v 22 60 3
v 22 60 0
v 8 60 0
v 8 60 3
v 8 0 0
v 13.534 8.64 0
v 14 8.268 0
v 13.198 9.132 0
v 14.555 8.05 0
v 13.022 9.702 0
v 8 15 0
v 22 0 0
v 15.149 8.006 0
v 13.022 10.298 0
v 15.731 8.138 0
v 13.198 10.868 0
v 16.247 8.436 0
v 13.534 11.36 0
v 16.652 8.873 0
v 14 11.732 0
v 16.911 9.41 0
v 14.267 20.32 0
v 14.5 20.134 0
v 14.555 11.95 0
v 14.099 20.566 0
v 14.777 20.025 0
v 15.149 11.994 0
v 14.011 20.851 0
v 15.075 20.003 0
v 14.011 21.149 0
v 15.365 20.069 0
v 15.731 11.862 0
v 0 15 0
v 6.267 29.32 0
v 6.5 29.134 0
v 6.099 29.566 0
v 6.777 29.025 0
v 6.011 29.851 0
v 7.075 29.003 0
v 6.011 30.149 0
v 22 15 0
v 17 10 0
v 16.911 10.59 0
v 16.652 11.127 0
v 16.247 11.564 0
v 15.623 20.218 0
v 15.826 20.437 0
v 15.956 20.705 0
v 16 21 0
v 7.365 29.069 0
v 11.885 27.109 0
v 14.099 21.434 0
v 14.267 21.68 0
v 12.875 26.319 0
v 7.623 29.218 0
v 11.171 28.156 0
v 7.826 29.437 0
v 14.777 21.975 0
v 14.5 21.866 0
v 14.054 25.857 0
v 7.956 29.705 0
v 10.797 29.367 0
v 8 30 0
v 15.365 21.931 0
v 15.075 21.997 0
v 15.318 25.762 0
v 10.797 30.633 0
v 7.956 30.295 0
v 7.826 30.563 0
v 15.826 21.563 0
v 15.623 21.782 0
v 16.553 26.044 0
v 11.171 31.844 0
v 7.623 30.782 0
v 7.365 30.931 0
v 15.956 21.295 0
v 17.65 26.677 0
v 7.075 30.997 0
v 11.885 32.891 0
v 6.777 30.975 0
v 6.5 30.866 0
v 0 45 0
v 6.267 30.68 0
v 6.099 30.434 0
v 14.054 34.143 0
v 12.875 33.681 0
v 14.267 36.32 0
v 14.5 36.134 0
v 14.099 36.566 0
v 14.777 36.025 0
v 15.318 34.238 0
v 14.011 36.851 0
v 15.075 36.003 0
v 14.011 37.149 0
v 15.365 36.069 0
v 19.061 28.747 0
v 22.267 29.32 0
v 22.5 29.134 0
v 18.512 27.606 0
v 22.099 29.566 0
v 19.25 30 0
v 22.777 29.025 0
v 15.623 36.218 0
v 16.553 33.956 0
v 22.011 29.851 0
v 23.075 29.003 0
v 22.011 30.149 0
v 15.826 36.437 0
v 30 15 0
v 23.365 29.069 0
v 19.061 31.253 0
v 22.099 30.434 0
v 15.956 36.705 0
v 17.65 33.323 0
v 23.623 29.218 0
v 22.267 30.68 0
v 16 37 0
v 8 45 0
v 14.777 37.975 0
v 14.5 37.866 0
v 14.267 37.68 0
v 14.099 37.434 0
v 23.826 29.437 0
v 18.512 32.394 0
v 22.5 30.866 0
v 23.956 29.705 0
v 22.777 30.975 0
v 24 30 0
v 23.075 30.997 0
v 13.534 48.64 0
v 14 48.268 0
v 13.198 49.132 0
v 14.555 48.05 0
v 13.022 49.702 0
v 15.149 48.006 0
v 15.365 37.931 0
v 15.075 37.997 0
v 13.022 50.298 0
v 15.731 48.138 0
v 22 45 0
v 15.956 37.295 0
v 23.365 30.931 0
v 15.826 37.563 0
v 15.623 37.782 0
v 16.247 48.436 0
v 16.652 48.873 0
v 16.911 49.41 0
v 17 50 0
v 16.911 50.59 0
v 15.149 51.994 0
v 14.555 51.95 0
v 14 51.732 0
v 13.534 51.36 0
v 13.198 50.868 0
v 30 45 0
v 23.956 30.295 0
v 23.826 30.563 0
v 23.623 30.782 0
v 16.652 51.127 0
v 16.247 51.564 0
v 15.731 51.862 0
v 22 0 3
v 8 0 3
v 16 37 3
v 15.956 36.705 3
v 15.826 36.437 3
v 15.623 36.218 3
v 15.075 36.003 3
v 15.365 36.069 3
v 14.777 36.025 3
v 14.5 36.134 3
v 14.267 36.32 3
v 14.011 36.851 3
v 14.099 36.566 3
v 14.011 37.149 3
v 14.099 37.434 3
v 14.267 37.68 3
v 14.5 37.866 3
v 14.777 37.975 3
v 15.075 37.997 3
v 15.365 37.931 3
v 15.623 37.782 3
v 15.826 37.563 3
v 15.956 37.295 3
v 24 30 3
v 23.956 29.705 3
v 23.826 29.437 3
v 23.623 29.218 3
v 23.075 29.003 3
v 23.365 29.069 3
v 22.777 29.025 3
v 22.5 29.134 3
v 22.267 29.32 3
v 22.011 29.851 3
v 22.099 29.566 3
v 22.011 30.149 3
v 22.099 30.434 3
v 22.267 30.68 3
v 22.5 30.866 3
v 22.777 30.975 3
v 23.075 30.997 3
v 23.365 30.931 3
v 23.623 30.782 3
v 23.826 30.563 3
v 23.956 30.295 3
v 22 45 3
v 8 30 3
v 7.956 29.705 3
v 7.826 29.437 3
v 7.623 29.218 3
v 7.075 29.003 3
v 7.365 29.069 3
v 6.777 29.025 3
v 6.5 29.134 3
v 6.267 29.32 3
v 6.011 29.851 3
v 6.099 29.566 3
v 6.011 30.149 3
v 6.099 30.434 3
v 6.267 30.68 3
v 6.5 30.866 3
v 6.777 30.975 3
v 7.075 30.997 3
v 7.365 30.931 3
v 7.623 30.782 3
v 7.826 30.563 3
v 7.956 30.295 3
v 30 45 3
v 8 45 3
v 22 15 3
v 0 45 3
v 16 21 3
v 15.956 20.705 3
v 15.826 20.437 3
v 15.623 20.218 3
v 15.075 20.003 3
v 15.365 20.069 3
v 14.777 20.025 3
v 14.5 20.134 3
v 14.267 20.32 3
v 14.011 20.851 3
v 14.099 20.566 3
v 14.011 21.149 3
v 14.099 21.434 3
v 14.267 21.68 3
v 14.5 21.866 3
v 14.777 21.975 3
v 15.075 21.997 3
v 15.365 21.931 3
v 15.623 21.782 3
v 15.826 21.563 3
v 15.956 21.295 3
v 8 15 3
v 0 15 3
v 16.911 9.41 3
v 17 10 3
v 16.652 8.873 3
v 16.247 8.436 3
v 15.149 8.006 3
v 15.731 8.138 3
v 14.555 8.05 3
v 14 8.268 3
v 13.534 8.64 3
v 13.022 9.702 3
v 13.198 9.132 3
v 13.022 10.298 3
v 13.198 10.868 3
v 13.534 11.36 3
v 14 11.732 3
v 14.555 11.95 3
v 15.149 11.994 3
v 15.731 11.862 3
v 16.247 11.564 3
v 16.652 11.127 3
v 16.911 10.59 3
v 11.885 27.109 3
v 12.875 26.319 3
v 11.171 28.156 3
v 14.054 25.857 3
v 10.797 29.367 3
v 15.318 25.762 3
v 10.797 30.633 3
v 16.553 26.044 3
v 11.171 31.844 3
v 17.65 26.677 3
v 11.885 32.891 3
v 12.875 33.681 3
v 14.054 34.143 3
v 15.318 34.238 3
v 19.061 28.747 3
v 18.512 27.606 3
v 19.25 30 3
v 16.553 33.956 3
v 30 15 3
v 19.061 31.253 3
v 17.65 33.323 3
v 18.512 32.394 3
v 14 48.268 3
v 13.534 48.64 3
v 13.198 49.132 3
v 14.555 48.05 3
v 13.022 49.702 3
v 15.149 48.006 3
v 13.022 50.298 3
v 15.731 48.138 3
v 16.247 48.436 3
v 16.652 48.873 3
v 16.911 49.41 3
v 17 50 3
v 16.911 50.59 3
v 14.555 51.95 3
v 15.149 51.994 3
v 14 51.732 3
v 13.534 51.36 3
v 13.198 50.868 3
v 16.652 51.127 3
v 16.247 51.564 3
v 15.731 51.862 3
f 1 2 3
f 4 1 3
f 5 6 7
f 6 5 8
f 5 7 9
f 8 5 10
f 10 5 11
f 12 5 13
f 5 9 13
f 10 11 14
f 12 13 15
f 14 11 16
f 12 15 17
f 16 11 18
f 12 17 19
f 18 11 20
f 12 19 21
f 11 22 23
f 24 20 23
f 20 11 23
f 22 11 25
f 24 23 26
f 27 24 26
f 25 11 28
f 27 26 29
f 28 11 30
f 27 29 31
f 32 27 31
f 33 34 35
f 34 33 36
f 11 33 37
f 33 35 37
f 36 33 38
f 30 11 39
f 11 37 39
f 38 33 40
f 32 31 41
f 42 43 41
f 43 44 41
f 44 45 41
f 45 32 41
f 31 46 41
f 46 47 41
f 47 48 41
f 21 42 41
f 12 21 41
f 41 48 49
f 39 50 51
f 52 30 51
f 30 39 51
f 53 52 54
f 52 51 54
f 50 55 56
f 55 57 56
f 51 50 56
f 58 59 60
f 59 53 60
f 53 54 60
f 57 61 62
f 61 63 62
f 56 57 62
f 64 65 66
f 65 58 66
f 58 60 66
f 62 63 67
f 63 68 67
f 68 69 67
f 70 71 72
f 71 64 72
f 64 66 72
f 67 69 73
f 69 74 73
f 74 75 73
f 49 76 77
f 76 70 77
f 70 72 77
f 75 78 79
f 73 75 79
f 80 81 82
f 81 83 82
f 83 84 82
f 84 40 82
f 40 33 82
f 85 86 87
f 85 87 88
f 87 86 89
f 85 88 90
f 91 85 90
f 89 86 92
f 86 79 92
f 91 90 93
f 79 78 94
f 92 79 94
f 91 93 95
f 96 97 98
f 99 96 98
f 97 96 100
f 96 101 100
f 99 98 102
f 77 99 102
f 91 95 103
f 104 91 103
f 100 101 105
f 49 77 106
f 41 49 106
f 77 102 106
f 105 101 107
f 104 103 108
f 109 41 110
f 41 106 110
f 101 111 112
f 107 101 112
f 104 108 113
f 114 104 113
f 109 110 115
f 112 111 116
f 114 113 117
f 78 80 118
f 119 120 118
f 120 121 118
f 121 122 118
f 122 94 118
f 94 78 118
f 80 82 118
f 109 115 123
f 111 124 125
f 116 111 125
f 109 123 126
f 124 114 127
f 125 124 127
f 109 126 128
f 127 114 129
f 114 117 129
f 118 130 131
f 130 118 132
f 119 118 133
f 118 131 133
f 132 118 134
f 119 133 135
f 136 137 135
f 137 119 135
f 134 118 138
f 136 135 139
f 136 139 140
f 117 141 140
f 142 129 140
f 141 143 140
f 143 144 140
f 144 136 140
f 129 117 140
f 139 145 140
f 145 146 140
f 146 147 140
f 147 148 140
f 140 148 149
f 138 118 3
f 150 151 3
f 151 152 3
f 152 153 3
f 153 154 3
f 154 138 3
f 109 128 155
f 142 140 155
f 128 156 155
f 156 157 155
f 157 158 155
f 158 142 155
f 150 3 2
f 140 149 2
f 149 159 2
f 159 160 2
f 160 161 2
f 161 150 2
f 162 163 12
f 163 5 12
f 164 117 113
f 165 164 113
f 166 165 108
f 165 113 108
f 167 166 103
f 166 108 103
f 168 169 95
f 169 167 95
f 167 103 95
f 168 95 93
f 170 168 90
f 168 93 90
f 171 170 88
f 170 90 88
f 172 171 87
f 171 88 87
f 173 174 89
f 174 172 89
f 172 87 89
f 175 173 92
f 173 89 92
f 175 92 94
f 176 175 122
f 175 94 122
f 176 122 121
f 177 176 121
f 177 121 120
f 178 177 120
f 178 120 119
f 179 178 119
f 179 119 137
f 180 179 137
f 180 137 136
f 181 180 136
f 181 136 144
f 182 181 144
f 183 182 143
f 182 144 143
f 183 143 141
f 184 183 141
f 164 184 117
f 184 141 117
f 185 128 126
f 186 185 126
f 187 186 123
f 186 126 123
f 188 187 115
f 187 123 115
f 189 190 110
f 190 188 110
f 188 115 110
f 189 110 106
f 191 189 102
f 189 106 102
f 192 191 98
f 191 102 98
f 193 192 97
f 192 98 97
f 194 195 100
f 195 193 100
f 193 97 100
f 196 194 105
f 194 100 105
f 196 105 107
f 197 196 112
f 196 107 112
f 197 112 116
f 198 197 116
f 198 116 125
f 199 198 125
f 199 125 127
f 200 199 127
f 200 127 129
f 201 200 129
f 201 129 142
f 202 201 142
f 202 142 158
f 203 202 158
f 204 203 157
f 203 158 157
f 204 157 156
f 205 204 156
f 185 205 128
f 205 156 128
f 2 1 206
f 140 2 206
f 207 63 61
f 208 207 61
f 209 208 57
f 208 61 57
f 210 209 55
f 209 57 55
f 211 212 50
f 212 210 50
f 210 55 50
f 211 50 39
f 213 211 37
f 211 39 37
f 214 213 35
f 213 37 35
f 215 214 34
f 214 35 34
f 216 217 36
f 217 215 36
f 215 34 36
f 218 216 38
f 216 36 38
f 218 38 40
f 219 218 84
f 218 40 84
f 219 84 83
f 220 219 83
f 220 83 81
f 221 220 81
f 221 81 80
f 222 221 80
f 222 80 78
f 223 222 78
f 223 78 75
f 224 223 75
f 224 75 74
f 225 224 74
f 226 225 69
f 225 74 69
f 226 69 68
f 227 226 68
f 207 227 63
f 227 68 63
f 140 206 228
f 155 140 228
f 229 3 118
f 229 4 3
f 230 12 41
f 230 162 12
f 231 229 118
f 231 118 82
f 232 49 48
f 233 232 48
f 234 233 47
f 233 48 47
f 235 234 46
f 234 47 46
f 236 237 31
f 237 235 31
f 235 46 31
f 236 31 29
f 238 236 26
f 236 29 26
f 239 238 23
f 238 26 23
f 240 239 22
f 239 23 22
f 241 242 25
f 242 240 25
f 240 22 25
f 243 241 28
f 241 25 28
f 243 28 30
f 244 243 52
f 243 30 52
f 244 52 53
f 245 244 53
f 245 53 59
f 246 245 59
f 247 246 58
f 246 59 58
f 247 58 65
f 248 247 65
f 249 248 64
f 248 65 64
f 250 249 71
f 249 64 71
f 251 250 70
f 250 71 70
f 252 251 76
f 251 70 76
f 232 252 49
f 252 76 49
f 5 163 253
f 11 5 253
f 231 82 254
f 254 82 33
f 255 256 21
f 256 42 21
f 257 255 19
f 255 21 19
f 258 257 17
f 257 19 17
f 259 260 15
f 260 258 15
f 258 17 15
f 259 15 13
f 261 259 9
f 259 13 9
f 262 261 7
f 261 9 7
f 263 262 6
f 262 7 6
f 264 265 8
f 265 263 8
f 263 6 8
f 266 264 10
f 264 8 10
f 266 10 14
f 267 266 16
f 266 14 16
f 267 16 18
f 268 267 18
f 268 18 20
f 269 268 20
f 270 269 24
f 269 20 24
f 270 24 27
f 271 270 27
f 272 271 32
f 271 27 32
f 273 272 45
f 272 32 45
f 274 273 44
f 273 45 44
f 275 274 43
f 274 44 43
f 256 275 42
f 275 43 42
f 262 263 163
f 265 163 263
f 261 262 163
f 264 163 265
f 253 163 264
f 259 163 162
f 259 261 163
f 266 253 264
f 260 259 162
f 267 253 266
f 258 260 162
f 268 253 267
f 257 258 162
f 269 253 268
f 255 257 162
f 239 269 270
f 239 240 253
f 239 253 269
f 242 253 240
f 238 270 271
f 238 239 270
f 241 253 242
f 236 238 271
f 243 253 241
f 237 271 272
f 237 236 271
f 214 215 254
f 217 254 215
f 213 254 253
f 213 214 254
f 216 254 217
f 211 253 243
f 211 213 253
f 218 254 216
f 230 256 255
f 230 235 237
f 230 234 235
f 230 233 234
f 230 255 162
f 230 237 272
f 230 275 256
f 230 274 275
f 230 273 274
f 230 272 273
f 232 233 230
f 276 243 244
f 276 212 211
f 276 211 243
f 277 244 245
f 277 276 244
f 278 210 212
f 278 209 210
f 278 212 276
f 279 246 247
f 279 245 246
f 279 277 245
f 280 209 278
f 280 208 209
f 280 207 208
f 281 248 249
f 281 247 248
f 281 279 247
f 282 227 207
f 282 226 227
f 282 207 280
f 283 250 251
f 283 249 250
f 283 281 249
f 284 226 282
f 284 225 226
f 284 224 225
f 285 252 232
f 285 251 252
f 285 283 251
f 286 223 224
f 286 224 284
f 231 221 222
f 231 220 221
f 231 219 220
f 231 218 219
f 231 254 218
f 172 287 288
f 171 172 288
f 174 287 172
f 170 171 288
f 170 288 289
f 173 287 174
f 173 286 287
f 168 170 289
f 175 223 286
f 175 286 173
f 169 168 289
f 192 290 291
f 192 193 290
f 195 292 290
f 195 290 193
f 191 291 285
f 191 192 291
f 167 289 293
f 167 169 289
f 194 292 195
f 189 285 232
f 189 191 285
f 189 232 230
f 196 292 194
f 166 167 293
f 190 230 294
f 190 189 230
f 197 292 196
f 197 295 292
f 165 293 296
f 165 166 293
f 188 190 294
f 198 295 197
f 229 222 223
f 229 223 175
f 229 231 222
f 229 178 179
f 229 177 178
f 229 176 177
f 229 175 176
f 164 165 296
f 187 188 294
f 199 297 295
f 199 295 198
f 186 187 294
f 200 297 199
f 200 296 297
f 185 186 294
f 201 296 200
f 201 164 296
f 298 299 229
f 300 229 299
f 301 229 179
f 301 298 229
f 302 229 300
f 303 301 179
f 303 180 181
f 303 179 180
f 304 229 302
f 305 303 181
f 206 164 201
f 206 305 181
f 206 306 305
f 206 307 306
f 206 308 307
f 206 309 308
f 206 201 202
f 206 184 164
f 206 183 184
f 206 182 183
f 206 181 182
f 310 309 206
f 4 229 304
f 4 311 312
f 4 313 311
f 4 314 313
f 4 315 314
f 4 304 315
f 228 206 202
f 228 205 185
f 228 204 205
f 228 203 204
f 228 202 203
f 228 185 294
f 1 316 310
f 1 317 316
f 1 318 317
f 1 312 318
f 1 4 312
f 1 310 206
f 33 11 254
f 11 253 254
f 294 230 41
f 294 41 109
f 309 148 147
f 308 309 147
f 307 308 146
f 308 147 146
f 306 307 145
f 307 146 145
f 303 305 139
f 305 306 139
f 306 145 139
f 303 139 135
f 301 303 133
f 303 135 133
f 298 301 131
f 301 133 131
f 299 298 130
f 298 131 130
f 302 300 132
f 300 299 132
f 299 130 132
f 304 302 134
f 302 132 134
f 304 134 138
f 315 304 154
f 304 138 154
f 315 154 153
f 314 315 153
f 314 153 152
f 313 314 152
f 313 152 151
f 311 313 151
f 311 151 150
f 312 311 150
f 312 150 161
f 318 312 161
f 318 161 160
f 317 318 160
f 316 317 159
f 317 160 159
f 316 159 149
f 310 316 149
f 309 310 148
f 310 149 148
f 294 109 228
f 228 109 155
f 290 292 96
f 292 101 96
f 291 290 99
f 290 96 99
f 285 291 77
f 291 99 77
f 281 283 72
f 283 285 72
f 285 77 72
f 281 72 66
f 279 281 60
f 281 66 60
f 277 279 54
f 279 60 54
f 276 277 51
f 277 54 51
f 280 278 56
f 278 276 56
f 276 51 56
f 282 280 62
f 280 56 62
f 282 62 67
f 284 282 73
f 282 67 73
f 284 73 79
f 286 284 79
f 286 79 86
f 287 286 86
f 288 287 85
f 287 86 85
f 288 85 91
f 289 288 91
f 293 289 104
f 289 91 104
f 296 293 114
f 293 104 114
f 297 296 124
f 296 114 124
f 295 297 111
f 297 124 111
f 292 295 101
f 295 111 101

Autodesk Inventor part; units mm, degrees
ref_plane "YZ Plane" through (0, 0, 0) normal (1, 0, 0) x (0, 1, 0)
ref_plane "XZ Plane" through (0, 0, 0) normal (0, 1, 0) x (-1, 0, 0)
ref_plane "XY Plane" through (0, 0, 0) normal (0, 0, 1) x (1, 0, 0)
sketch "Boceto1" plane through (0, 0, 0) normal (0, 0, 1) x (1, 0, 0)
  line L0 (0, 0) -> (30, 0)
  line L1 (30, 0) -> (30, 60)
  line L2 (30, 60) -> (0, 60)
  line L3 (0, 60) -> (0, 0)
  circle A0 centre (15, 30) radius 4.25
  circle A1 centre (7, 30) radius 1
  circle A2 centre (23, 30) radius 1
  circle A3 centre (15, 37) radius 1
  circle A4 centre (15, 21) radius 1
  circle A5 centre (15, 50) radius 2
  circle A6 centre (15, 10) radius 2
  point P0 (15, 0)
  dimension "d0" = 30
  dimension "d1" = 60
  dimension "d2" = 8.5
  dimension "d3" = 2
  dimension "d4" = 2
  dimension "d7" = 2
  dimension "d8" = 2
  dimension "d9" = 16
  dimension "d21" = 30
  dimension "d22" = 23
  dimension "d24" = 0
  dimension "d25" = 0
  dimension "d26" = 16
  dimension "d27" = 7
  dimension "d28" = 4
  dimension "d29" = 4
  dimension "d30" = 20
  dimension "d31" = 20
extrude "Extrusión1" add sketch "Boceto1" along normal blind 3
thread "Rosca1" size "M2x0.4" class "6H" standard "ANSI Metric M Profile" full length
thread "Rosca2" size "M2x0.4" class "6H" standard "ANSI Metric M Profile" full length
thread "Rosca3" size "M2x0.4" class "6H" standard "ANSI Metric M Profile" full length
thread "Rosca4" size "M2x0.4" class "6H" standard "ANSI Metric M Profile" full length
thread "Rosca5" size "M4x0.7" class "6H" standard "ANSI Metric M Profile" full length
thread "Rosca6" size "M4x0.7" class "6H" standard "ANSI Metric M Profile" full length
sketch "Boceto2" plane through (0, 0, 3) normal (0, 0, 1) x (1, 0, 0)
  line L0 (30, 60) -> (0, 60) projected
  line L1 (0, 60) -> (8, 60)
  line L2 (8, 60) -> (8, 45)
  line L3 (8, 45) -> (0, 45)
  line L4 (0, 45) -> (0, 60)
  line L5 (30, 60) -> (22, 60)
  line L6 (22, 60) -> (22, 45)
  line L7 (22, 45) -> (30, 45)
  line L8 (30, 45) -> (30, 60)
  line L9 (0, 0) -> (30, 0) projected
  line L10 (0, 0) -> (8, 0)
  line L11 (8, 0) -> (8, 15)
  line L12 (8, 15) -> (0, 15)
  line L13 (0, 15) -> (0, 0)
  line L14 (30, 0) -> (22, 0)
  line L15 (22, 0) -> (22, 15)
  line L16 (22, 15) -> (30, 15)
  line L17 (30, 15) -> (30, 0)
  dimension "d36" = 8
  dimension "d37" = 15
  dimension "d38" = 8
  dimension "d39" = 15
  dimension "d40" = 8
  dimension "d41" = 15
  dimension "d42" = 8
  dimension "d43" = 15
extrude "Extrusión2" cut sketch "Boceto2" against normal blind 3
properties part number "placa_soporte_motor"
